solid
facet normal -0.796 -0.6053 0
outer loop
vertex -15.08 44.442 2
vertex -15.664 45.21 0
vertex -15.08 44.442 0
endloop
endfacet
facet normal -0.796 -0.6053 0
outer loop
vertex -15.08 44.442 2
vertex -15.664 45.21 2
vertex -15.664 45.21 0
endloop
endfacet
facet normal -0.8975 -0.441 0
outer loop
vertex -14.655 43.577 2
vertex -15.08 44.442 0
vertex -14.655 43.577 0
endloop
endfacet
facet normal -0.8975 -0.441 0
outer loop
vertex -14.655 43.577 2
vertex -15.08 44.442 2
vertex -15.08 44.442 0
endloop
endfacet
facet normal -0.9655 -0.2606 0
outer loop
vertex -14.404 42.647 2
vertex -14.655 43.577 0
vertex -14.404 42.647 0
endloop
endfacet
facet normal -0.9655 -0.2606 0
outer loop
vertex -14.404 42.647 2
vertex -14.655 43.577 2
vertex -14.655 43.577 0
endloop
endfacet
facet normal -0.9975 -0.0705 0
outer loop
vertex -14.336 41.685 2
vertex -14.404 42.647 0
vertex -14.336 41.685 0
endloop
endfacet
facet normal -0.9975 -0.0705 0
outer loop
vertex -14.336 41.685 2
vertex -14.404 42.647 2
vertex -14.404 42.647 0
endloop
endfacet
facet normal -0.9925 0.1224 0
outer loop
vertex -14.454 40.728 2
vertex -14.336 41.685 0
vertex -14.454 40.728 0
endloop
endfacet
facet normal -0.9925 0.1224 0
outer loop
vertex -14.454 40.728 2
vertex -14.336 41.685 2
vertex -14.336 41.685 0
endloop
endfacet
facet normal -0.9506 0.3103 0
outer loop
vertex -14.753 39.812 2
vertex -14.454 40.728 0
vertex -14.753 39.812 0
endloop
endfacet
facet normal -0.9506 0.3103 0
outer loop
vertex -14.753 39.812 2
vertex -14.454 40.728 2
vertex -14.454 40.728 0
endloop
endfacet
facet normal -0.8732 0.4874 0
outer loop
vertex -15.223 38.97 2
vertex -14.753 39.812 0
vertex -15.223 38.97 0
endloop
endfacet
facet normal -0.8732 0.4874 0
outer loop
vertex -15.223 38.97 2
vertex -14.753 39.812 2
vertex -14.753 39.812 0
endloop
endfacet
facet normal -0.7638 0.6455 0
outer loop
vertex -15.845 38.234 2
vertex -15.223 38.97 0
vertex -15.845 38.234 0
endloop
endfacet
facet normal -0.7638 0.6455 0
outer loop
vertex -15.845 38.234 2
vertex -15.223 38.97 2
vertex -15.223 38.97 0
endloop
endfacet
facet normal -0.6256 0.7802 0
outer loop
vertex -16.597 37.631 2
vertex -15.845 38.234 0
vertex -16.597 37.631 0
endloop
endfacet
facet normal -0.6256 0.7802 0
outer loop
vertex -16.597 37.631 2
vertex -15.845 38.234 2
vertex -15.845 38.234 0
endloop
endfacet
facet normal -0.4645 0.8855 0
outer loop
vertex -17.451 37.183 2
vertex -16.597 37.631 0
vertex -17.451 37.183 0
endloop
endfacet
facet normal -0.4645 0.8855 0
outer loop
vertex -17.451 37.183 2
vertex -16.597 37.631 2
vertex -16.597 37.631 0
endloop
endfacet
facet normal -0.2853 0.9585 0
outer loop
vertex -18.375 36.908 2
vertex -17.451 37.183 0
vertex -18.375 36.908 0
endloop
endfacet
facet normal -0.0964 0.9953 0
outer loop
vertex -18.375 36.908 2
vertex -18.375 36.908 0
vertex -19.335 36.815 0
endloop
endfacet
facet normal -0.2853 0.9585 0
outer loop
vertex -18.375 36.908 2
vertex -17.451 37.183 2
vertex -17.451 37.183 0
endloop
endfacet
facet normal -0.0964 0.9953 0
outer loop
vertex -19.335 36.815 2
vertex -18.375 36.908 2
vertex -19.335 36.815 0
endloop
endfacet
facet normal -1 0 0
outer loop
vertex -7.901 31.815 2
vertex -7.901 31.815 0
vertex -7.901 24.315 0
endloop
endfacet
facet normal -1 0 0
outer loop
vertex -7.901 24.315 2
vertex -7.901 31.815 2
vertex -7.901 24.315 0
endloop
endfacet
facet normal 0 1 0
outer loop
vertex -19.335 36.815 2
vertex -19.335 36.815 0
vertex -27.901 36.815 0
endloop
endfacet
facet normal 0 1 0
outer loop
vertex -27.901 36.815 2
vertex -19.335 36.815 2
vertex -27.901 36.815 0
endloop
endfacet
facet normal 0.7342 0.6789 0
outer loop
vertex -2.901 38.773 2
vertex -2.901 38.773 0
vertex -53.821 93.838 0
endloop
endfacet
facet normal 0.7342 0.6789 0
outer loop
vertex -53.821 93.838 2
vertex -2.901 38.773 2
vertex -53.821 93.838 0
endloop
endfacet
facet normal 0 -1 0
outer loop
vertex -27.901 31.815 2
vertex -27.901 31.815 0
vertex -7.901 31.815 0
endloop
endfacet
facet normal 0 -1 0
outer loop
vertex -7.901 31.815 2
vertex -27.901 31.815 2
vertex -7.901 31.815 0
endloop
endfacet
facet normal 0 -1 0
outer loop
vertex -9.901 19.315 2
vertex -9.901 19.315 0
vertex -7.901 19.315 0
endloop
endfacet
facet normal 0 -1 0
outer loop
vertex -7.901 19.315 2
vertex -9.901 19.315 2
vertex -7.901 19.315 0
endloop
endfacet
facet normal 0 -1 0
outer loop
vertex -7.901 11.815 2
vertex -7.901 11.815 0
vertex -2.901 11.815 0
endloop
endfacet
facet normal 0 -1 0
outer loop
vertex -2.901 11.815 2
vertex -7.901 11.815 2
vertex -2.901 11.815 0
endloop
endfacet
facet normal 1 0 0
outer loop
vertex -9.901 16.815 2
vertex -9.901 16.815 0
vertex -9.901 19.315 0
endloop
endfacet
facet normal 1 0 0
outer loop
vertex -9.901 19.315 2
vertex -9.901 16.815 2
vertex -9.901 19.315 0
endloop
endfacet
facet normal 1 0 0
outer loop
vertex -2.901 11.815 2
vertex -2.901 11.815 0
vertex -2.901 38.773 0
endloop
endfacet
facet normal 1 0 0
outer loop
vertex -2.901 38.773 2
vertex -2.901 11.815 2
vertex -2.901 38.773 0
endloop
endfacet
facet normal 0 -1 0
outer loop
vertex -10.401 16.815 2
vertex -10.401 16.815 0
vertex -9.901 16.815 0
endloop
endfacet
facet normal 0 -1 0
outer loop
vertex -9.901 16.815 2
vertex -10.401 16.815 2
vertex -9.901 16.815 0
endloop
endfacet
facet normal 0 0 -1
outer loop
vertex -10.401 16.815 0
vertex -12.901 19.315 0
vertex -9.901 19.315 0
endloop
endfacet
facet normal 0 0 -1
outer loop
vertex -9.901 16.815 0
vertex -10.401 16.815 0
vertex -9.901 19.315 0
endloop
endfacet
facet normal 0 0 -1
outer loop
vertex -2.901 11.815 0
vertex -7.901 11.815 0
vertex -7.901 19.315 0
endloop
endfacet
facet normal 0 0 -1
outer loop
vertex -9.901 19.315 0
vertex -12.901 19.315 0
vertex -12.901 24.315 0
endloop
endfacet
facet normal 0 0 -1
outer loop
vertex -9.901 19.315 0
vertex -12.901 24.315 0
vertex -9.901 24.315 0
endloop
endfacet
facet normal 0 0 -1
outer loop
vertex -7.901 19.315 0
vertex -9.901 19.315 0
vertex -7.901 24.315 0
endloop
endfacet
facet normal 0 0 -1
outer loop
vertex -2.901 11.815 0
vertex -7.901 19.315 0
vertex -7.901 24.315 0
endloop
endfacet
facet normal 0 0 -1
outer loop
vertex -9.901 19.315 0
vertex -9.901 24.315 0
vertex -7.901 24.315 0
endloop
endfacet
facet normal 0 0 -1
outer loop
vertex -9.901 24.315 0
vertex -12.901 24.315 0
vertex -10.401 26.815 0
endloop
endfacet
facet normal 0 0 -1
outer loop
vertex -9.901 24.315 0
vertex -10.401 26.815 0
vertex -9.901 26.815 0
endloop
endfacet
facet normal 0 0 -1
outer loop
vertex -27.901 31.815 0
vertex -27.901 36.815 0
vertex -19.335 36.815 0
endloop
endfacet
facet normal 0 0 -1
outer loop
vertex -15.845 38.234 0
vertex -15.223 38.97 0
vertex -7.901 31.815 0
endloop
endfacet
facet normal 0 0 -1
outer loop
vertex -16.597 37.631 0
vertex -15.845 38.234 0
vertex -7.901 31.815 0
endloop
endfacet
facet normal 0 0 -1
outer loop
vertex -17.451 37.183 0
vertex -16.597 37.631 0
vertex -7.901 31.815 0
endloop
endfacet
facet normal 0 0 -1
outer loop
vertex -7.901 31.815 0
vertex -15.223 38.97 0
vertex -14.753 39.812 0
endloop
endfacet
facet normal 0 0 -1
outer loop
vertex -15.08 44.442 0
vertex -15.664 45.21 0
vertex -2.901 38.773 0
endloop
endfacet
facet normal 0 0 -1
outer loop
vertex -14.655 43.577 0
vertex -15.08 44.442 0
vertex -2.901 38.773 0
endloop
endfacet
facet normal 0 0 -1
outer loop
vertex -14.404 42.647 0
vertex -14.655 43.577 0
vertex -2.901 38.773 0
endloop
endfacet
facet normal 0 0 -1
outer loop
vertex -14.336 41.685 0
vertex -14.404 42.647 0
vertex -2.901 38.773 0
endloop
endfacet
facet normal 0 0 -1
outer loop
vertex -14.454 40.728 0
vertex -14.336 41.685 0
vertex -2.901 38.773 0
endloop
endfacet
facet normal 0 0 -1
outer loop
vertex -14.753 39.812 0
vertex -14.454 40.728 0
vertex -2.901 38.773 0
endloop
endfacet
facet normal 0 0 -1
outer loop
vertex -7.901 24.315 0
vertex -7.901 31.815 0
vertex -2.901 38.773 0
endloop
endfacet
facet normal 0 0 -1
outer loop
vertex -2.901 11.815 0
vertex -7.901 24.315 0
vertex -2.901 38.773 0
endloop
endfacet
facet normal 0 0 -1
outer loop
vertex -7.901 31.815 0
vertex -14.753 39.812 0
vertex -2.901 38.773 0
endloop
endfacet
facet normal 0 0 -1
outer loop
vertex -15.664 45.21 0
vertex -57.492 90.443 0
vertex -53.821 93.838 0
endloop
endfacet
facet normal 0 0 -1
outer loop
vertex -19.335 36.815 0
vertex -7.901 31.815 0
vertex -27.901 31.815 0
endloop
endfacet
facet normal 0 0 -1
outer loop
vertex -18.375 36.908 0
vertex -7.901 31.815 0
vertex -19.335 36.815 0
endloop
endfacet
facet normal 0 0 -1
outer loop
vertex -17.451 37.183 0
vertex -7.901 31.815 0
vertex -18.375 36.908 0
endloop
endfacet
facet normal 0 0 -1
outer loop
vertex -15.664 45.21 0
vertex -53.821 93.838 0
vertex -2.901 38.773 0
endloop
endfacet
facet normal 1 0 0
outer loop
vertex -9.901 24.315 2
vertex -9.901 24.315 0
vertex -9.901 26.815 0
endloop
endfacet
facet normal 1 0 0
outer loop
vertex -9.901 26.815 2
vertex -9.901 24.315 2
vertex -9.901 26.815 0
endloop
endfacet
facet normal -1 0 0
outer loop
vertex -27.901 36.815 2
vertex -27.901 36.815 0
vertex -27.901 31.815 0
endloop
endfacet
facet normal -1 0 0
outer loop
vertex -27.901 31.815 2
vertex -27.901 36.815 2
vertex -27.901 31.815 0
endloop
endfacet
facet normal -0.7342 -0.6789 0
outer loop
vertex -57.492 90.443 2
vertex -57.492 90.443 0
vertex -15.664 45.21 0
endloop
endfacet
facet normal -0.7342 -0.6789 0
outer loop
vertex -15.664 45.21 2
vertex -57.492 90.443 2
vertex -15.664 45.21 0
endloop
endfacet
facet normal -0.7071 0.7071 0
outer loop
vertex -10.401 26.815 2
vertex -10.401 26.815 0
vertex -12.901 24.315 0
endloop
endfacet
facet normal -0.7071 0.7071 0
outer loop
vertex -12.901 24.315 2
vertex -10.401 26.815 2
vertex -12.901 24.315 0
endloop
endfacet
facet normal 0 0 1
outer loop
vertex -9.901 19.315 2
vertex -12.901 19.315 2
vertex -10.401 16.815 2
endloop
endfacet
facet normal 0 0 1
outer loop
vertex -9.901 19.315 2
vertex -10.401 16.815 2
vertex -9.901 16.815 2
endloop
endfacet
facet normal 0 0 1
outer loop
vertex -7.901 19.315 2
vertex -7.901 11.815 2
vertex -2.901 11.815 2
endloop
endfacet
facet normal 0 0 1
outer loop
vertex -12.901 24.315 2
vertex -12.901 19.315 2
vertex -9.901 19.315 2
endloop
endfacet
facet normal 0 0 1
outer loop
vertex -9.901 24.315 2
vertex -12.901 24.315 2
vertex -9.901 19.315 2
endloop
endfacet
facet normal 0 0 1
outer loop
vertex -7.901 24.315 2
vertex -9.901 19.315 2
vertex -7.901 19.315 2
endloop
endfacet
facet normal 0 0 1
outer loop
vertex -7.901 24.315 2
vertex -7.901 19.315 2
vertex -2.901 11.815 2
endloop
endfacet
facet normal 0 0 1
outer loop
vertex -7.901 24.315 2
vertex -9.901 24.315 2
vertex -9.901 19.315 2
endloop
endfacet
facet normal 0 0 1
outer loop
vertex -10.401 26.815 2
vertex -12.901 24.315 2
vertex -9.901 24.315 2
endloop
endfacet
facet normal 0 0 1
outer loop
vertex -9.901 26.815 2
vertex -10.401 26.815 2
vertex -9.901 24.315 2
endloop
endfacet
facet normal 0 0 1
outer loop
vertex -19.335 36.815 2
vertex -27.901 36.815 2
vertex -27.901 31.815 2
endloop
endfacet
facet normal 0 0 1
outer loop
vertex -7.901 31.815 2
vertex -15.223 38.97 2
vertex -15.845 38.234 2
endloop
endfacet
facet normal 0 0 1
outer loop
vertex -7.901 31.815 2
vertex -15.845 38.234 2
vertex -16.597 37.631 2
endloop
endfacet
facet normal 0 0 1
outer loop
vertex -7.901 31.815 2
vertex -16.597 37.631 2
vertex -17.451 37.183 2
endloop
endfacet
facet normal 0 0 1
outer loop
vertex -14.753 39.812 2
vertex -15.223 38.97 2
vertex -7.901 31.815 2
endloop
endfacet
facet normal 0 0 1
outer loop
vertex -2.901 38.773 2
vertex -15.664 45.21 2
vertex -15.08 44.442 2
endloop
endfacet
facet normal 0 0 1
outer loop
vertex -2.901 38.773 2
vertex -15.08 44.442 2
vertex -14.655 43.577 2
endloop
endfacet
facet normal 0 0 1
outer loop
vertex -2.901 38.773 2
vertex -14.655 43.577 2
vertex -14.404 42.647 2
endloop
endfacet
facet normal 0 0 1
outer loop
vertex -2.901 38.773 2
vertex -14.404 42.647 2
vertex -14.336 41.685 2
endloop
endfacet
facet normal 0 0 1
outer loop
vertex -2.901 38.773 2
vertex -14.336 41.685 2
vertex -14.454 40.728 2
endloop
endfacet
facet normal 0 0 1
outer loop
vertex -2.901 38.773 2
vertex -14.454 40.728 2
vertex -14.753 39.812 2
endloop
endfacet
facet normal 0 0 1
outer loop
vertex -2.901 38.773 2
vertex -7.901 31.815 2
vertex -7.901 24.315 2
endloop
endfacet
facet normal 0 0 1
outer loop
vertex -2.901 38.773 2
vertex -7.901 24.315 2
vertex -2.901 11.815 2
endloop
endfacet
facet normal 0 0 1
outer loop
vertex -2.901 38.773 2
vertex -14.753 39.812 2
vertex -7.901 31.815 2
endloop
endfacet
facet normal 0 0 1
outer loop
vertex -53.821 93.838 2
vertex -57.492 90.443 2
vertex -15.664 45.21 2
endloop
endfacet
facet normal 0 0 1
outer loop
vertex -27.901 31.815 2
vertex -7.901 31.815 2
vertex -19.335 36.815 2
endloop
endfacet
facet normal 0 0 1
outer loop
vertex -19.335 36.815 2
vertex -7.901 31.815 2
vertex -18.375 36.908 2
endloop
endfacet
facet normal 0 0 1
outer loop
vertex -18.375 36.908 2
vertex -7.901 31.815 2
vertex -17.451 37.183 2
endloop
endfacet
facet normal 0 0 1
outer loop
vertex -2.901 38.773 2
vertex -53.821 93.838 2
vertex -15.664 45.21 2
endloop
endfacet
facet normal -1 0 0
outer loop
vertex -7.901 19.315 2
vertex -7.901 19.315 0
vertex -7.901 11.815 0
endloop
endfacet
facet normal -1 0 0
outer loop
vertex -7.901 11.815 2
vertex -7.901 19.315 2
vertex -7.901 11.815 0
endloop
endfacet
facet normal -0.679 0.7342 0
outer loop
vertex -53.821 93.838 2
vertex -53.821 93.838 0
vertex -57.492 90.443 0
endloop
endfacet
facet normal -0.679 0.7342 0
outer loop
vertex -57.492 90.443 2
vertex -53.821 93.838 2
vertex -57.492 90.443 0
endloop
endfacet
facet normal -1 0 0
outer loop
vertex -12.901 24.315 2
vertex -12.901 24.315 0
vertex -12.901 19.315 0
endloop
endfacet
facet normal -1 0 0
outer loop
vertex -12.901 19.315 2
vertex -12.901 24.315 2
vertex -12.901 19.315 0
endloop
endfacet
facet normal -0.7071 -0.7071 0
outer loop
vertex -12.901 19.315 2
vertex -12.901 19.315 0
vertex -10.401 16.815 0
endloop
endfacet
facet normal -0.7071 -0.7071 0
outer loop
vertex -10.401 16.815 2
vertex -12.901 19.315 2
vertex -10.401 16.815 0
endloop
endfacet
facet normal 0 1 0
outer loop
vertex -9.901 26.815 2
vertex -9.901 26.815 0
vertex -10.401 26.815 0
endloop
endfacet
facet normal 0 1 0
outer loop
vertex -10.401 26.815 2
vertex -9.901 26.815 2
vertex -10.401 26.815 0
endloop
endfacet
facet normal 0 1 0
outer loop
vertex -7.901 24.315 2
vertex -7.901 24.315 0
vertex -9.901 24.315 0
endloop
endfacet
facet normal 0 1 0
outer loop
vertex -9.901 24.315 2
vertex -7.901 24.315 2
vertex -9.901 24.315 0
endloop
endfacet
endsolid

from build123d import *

# Parameters (mm, degrees)
F1_DEPTH = 2
F2_R     = 5


with BuildPart() as f1:
    # F0 (on Top) → F1 (new body)
    with BuildSketch(Plane.XY):
        Polygon((-27.900762, 36.815232), (-27.900762, 31.815232), (-7.900762, 31.815232), (-7.900762, 24.315232), (-9.900762, 24.315232), (-9.900762, 26.815232), (-10.400762, 26.815232), (-12.900762, 24.315232), (-12.900762, 19.315232), (-10.400762, 16.815232), (-9.900762, 16.815232), (-9.900762, 19.315232), (-7.900762, 19.315232), (-7.900762, 11.815232), (-2.900762, 11.815232), (-2.900762, 38.772724), (-53.820934, 93.837559), (-57.491923, 90.442881), (-7.900762, 36.815232), align=None)
    extrude(amount=F1_DEPTH)

    # F2
    f2_edges = [f1.edges().sort_by_distance(p)[0] for p in [
        (-7.900762, 36.815232, 1),
    ]]
    fillet(f2_edges, radius=F2_R)


solid = f1.part
